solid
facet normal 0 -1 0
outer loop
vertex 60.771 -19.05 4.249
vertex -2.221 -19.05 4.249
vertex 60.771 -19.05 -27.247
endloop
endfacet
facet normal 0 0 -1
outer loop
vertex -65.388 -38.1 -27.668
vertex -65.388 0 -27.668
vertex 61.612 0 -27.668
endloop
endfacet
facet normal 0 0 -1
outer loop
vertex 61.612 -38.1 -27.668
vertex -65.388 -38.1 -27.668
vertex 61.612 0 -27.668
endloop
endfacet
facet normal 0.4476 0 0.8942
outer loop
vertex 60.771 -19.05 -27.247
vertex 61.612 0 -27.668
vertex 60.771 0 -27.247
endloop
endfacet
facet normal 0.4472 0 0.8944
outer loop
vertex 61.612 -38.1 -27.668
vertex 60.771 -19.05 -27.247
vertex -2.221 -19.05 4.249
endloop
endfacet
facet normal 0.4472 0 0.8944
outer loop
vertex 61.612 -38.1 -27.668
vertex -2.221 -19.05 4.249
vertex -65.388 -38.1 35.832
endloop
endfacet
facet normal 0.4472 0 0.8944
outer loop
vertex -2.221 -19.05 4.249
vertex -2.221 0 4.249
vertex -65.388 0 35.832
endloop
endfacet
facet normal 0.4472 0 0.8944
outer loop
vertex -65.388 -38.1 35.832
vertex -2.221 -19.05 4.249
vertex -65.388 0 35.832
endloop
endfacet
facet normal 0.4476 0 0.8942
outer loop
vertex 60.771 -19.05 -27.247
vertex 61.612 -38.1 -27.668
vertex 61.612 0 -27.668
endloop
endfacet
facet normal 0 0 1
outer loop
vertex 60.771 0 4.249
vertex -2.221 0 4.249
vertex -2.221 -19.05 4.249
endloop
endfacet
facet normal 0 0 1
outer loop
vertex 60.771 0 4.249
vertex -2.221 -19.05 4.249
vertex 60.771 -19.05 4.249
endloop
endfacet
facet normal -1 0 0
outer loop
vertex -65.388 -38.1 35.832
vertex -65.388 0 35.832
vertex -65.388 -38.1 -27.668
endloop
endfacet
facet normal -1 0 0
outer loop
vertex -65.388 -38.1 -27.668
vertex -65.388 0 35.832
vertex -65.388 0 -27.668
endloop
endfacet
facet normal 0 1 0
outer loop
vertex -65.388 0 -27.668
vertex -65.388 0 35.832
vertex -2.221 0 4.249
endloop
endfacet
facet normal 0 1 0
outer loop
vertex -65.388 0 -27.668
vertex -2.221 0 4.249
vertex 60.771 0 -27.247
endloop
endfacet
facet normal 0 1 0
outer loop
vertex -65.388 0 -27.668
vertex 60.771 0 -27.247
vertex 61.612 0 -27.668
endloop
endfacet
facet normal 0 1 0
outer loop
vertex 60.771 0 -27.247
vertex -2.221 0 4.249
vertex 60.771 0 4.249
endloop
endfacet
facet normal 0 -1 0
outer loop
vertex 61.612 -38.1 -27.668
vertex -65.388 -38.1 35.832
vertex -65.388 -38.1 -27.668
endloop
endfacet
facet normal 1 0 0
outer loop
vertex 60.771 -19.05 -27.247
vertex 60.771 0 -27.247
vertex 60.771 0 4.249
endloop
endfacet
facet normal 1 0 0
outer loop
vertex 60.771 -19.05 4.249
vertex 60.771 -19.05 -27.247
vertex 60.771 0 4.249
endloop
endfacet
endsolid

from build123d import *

# Parameters (mm, degrees)
F1_DEPTH = 38.1
F2_W     = 63.5
F2_H     = 31.75
F3_DEPTH = 19.05


with BuildPart() as f1:
    # F0 (on Front) → F1 (new body)
    with BuildSketch(Plane.XZ):
        Polygon((61.612287, -27.667911), (-1.887713, 4.082089), (-1.887713, -27.667911), align=None)
        Polygon((-1.887713, 4.082089), (-65.387713, 35.832089), (-65.387713, -27.667911), (-1.887713, -27.667911), align=None)
    extrude(amount=F1_DEPTH)

    # F2 (on Front) → F3 (join)
    with BuildSketch(Plane.XZ):
        with Locations((29.02056, -11.626451)):
            Rectangle(F2_W, F2_H)
    extrude(amount=F3_DEPTH)


solid = f1.part
